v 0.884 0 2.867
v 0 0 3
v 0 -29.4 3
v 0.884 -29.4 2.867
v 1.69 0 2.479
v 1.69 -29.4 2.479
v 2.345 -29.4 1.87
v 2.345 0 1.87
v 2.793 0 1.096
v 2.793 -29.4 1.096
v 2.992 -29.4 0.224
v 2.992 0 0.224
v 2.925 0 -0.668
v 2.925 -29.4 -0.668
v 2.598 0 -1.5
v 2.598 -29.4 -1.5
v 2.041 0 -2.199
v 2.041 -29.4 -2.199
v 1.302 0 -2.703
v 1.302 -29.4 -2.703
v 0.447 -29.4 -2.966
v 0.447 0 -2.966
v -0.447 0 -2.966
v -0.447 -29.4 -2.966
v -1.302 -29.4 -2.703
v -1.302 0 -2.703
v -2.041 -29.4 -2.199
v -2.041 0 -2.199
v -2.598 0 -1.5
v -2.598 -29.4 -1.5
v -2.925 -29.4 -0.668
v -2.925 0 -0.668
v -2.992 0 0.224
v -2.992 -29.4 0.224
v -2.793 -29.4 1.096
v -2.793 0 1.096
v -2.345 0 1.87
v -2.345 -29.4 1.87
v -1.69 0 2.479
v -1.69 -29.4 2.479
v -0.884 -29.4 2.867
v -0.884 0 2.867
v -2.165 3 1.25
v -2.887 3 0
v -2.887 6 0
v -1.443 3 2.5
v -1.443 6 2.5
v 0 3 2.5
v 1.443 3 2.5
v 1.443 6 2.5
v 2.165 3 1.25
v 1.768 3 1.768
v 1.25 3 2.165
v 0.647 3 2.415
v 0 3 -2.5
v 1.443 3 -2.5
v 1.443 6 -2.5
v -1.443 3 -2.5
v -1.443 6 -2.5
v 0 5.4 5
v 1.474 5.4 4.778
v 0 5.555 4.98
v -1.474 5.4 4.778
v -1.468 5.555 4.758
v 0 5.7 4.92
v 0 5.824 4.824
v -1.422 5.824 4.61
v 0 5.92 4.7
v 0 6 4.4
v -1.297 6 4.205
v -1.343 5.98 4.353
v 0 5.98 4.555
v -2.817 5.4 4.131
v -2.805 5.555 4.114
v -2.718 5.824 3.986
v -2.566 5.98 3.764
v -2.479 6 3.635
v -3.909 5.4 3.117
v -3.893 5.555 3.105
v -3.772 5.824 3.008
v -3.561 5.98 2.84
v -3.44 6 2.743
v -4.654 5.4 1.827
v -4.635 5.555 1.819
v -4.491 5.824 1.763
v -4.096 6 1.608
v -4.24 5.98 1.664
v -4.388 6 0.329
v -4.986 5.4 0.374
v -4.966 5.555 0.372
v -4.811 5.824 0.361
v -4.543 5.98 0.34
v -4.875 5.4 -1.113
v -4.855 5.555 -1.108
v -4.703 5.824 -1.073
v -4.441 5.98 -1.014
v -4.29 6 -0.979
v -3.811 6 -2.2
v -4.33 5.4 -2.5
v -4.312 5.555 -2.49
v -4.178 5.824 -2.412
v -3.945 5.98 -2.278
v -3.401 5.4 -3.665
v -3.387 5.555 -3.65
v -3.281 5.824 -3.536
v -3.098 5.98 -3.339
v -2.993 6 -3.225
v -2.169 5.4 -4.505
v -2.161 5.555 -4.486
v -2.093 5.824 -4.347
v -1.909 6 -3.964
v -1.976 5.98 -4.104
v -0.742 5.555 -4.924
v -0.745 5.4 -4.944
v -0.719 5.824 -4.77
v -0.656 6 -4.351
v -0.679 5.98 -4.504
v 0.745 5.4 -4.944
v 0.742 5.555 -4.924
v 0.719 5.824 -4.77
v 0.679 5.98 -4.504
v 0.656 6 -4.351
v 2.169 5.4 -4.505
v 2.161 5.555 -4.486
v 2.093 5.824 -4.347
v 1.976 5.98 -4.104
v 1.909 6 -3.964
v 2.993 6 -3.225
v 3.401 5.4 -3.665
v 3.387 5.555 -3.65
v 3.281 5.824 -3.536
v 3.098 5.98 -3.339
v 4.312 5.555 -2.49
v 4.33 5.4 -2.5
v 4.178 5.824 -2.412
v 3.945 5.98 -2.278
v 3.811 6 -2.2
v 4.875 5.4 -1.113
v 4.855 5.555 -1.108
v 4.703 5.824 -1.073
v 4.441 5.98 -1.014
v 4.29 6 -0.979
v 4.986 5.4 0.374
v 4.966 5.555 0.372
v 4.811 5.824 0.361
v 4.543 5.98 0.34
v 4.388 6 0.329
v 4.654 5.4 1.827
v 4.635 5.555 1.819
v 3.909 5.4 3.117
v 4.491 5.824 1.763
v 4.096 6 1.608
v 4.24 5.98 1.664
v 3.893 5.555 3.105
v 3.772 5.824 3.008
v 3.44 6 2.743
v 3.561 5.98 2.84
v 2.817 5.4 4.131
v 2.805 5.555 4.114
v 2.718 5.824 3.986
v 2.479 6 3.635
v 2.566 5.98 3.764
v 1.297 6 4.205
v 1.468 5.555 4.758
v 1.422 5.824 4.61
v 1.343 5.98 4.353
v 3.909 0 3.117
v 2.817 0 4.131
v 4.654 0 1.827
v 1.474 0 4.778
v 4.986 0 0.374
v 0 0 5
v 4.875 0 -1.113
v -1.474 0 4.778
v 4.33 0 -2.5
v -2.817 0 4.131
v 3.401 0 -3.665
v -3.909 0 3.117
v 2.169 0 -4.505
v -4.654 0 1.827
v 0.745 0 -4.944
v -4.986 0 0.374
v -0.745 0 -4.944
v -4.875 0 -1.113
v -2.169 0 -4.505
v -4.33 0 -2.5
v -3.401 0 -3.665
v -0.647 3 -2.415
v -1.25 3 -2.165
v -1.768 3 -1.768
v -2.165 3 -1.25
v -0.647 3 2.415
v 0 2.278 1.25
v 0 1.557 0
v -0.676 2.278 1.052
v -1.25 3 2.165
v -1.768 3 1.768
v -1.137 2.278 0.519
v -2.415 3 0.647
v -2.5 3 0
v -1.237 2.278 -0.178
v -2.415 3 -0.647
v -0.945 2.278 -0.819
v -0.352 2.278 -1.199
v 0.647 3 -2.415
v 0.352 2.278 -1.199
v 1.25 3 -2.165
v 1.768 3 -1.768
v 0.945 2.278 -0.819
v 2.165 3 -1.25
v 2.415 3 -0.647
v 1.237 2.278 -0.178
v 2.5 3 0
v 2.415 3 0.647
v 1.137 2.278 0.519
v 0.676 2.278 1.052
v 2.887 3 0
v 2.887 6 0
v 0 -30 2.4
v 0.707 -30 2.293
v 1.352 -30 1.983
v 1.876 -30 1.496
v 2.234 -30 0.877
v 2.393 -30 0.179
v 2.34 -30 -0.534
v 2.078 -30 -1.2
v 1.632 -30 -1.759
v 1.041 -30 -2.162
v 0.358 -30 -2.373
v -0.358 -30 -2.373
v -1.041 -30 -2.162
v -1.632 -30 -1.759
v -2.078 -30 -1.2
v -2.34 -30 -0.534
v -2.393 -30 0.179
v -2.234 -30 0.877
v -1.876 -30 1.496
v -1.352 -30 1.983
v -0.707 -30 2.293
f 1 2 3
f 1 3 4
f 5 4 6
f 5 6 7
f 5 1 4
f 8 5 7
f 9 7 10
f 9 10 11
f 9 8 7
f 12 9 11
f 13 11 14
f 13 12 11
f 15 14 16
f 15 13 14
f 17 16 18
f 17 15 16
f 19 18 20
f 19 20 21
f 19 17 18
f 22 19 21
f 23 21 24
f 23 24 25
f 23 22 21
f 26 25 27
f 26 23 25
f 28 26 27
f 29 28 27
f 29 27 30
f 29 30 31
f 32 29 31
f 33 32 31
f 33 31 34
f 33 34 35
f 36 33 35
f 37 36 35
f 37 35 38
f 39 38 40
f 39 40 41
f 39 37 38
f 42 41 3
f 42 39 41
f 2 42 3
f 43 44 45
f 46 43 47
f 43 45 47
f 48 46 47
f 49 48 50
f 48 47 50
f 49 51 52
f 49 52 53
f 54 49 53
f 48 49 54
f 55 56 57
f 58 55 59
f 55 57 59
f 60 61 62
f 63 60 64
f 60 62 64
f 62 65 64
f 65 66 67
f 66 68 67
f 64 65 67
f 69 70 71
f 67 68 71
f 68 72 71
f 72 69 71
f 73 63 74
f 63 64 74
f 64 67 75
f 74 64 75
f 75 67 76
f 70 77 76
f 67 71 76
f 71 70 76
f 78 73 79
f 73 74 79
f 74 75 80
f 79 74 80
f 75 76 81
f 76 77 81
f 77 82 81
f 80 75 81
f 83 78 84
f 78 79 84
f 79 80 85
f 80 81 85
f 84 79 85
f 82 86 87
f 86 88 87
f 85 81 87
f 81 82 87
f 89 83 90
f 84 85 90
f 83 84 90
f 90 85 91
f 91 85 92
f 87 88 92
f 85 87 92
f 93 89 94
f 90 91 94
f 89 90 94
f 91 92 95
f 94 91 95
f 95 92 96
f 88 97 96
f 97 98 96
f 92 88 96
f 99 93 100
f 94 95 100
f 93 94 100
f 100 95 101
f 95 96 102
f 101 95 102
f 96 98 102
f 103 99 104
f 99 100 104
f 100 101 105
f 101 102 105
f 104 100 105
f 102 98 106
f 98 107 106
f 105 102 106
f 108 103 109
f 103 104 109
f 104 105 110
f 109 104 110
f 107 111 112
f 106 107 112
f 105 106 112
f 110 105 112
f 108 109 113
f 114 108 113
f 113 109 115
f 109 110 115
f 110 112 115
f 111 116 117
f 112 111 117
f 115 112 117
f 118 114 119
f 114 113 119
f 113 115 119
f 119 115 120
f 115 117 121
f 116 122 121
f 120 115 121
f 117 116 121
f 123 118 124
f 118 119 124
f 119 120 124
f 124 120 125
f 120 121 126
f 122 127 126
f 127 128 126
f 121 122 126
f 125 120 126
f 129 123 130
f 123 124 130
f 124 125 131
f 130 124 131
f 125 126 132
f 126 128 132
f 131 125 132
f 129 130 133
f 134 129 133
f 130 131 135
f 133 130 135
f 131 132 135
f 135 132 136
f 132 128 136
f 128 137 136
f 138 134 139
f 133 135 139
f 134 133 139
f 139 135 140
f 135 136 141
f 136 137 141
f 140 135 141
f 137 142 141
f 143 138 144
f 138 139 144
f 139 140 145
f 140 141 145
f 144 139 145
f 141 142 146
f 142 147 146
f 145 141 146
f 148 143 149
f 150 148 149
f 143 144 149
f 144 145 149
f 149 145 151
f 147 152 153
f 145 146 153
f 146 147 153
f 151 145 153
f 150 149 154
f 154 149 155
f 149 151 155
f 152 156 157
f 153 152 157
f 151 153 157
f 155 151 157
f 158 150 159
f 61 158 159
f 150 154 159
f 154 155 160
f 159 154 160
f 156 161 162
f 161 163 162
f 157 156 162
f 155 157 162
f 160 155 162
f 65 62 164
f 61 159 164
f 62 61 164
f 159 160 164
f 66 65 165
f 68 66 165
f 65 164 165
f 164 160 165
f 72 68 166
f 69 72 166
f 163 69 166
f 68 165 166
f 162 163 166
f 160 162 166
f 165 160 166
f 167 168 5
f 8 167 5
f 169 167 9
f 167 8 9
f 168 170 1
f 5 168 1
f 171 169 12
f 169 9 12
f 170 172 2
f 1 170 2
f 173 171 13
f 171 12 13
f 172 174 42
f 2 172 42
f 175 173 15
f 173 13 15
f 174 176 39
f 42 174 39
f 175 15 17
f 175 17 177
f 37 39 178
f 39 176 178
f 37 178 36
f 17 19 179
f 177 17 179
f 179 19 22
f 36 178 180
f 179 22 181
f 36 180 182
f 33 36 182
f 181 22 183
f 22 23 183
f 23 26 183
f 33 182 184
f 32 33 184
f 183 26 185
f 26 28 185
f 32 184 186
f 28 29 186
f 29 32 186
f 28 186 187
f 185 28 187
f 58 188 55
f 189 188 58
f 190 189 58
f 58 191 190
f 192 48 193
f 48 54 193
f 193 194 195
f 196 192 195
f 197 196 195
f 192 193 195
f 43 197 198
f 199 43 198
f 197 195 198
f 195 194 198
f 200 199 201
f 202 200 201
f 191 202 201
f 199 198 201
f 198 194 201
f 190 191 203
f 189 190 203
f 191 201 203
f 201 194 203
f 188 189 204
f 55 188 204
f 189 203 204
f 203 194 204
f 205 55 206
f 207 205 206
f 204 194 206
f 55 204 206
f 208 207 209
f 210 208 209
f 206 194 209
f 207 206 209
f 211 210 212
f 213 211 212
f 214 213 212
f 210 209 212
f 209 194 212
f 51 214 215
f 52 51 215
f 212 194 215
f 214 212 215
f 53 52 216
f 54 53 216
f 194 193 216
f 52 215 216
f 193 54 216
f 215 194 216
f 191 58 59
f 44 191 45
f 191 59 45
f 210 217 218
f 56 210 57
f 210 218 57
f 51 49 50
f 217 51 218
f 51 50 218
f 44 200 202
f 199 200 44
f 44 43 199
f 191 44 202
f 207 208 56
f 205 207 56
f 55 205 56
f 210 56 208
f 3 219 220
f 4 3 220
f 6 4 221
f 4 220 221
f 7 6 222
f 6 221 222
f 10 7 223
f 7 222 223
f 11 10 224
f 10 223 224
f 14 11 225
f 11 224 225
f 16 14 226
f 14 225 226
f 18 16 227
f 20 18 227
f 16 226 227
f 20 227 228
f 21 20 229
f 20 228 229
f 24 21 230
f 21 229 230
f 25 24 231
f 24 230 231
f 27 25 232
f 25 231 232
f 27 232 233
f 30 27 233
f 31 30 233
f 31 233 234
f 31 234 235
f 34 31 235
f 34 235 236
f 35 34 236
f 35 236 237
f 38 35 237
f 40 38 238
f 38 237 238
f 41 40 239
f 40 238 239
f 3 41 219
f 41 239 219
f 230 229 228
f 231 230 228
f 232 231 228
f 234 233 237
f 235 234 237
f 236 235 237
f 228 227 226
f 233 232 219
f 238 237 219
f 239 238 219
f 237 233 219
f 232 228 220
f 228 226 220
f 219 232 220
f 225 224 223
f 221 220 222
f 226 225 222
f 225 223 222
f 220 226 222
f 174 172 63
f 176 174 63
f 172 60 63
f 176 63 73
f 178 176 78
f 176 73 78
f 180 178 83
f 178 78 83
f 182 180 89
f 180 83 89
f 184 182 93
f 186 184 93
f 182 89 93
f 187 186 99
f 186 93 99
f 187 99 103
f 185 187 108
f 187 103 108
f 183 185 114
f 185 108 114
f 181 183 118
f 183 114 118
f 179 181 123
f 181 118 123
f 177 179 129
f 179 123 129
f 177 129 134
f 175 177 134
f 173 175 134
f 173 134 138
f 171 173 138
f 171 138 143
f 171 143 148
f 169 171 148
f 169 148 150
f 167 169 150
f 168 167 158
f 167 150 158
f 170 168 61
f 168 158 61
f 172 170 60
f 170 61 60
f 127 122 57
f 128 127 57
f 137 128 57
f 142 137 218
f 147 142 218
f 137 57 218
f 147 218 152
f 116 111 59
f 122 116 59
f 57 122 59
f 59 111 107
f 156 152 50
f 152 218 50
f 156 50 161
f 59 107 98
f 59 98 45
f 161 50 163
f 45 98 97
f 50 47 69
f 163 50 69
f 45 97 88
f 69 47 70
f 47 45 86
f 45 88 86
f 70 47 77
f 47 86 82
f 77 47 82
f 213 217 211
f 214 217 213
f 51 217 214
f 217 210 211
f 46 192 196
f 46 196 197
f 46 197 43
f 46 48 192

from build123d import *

# Parameters (mm, degrees)
ESQUISSE2_R             = 3
BASE_EXTRUSION_DEPTH    = 30
CHANFREIN1_SIZE         = 0.6
ENL_V_MAT_EXTRU_1_DEPTH = 3


with BuildPart() as part:
    # Esquisse2 → Base-Extrusion (new body)
    with BuildSketch(Plane(origin=(0, 0, 0), x_dir=(1, 0, 0), z_dir=(0, 1, 0))):
        with Locations(Location((0, 0, 0), (0, 0, 270))):  # turned: the seam where the file's is
            Circle(ESQUISSE2_R)
    extrude(amount=-BASE_EXTRUSION_DEPTH)

    # Chanfrein1
    chanfrein1_edges = [part.edges().sort_by_distance(p)[0] for p in [
        (0, -30, -3),
    ]]
    chamfer(chanfrein1_edges, length=CHANFREIN1_SIZE)

    # Esquisse5 → Boss.-Révol.1 (revolve)
    with BuildSketch(Plane.XY, mode=Mode.PRIVATE) as boss_r_vol_1_sk:
        with BuildLine():
            Line((2.5, 6), (2.5, 3))
            Line((2.5, 3), (0, 1.556624327))
            Line((0, 1.556624327), (0, 0))
            Line((0, 0), (5, 0))
            Line((5, 0), (5, 5.4))
            ThreePointArc((5, 5.4), (4.824264069, 5.824264069), (4.4, 6))
            Line((4.4, 6), (2.5, 6))
        make_face()
    revolve(boss_r_vol_1_sk.sketch.rotate(Axis((0, 6, 0), (0, -1, 0)), 90), axis=Axis((0, 6, 0), (0, -1, 0)))  # turned: the seam where the file's is

    # Esquisse7 → Enlèv. mat.-Extru.1 (cut)
    with BuildSketch(Plane(origin=(0, 6, 0), x_dir=(-1, 0, 0), z_dir=(0, 1, 0))):
        Polygon((1.443375673, 2.5), (-1.443375673, 2.5), (-2.886751346, 0), (-1.443375673, -2.5), (1.443375673, -2.5), (2.886751346, 0), align=None)
    extrude(amount=-ENL_V_MAT_EXTRU_1_DEPTH, mode=Mode.SUBTRACT)


solid = part.part
